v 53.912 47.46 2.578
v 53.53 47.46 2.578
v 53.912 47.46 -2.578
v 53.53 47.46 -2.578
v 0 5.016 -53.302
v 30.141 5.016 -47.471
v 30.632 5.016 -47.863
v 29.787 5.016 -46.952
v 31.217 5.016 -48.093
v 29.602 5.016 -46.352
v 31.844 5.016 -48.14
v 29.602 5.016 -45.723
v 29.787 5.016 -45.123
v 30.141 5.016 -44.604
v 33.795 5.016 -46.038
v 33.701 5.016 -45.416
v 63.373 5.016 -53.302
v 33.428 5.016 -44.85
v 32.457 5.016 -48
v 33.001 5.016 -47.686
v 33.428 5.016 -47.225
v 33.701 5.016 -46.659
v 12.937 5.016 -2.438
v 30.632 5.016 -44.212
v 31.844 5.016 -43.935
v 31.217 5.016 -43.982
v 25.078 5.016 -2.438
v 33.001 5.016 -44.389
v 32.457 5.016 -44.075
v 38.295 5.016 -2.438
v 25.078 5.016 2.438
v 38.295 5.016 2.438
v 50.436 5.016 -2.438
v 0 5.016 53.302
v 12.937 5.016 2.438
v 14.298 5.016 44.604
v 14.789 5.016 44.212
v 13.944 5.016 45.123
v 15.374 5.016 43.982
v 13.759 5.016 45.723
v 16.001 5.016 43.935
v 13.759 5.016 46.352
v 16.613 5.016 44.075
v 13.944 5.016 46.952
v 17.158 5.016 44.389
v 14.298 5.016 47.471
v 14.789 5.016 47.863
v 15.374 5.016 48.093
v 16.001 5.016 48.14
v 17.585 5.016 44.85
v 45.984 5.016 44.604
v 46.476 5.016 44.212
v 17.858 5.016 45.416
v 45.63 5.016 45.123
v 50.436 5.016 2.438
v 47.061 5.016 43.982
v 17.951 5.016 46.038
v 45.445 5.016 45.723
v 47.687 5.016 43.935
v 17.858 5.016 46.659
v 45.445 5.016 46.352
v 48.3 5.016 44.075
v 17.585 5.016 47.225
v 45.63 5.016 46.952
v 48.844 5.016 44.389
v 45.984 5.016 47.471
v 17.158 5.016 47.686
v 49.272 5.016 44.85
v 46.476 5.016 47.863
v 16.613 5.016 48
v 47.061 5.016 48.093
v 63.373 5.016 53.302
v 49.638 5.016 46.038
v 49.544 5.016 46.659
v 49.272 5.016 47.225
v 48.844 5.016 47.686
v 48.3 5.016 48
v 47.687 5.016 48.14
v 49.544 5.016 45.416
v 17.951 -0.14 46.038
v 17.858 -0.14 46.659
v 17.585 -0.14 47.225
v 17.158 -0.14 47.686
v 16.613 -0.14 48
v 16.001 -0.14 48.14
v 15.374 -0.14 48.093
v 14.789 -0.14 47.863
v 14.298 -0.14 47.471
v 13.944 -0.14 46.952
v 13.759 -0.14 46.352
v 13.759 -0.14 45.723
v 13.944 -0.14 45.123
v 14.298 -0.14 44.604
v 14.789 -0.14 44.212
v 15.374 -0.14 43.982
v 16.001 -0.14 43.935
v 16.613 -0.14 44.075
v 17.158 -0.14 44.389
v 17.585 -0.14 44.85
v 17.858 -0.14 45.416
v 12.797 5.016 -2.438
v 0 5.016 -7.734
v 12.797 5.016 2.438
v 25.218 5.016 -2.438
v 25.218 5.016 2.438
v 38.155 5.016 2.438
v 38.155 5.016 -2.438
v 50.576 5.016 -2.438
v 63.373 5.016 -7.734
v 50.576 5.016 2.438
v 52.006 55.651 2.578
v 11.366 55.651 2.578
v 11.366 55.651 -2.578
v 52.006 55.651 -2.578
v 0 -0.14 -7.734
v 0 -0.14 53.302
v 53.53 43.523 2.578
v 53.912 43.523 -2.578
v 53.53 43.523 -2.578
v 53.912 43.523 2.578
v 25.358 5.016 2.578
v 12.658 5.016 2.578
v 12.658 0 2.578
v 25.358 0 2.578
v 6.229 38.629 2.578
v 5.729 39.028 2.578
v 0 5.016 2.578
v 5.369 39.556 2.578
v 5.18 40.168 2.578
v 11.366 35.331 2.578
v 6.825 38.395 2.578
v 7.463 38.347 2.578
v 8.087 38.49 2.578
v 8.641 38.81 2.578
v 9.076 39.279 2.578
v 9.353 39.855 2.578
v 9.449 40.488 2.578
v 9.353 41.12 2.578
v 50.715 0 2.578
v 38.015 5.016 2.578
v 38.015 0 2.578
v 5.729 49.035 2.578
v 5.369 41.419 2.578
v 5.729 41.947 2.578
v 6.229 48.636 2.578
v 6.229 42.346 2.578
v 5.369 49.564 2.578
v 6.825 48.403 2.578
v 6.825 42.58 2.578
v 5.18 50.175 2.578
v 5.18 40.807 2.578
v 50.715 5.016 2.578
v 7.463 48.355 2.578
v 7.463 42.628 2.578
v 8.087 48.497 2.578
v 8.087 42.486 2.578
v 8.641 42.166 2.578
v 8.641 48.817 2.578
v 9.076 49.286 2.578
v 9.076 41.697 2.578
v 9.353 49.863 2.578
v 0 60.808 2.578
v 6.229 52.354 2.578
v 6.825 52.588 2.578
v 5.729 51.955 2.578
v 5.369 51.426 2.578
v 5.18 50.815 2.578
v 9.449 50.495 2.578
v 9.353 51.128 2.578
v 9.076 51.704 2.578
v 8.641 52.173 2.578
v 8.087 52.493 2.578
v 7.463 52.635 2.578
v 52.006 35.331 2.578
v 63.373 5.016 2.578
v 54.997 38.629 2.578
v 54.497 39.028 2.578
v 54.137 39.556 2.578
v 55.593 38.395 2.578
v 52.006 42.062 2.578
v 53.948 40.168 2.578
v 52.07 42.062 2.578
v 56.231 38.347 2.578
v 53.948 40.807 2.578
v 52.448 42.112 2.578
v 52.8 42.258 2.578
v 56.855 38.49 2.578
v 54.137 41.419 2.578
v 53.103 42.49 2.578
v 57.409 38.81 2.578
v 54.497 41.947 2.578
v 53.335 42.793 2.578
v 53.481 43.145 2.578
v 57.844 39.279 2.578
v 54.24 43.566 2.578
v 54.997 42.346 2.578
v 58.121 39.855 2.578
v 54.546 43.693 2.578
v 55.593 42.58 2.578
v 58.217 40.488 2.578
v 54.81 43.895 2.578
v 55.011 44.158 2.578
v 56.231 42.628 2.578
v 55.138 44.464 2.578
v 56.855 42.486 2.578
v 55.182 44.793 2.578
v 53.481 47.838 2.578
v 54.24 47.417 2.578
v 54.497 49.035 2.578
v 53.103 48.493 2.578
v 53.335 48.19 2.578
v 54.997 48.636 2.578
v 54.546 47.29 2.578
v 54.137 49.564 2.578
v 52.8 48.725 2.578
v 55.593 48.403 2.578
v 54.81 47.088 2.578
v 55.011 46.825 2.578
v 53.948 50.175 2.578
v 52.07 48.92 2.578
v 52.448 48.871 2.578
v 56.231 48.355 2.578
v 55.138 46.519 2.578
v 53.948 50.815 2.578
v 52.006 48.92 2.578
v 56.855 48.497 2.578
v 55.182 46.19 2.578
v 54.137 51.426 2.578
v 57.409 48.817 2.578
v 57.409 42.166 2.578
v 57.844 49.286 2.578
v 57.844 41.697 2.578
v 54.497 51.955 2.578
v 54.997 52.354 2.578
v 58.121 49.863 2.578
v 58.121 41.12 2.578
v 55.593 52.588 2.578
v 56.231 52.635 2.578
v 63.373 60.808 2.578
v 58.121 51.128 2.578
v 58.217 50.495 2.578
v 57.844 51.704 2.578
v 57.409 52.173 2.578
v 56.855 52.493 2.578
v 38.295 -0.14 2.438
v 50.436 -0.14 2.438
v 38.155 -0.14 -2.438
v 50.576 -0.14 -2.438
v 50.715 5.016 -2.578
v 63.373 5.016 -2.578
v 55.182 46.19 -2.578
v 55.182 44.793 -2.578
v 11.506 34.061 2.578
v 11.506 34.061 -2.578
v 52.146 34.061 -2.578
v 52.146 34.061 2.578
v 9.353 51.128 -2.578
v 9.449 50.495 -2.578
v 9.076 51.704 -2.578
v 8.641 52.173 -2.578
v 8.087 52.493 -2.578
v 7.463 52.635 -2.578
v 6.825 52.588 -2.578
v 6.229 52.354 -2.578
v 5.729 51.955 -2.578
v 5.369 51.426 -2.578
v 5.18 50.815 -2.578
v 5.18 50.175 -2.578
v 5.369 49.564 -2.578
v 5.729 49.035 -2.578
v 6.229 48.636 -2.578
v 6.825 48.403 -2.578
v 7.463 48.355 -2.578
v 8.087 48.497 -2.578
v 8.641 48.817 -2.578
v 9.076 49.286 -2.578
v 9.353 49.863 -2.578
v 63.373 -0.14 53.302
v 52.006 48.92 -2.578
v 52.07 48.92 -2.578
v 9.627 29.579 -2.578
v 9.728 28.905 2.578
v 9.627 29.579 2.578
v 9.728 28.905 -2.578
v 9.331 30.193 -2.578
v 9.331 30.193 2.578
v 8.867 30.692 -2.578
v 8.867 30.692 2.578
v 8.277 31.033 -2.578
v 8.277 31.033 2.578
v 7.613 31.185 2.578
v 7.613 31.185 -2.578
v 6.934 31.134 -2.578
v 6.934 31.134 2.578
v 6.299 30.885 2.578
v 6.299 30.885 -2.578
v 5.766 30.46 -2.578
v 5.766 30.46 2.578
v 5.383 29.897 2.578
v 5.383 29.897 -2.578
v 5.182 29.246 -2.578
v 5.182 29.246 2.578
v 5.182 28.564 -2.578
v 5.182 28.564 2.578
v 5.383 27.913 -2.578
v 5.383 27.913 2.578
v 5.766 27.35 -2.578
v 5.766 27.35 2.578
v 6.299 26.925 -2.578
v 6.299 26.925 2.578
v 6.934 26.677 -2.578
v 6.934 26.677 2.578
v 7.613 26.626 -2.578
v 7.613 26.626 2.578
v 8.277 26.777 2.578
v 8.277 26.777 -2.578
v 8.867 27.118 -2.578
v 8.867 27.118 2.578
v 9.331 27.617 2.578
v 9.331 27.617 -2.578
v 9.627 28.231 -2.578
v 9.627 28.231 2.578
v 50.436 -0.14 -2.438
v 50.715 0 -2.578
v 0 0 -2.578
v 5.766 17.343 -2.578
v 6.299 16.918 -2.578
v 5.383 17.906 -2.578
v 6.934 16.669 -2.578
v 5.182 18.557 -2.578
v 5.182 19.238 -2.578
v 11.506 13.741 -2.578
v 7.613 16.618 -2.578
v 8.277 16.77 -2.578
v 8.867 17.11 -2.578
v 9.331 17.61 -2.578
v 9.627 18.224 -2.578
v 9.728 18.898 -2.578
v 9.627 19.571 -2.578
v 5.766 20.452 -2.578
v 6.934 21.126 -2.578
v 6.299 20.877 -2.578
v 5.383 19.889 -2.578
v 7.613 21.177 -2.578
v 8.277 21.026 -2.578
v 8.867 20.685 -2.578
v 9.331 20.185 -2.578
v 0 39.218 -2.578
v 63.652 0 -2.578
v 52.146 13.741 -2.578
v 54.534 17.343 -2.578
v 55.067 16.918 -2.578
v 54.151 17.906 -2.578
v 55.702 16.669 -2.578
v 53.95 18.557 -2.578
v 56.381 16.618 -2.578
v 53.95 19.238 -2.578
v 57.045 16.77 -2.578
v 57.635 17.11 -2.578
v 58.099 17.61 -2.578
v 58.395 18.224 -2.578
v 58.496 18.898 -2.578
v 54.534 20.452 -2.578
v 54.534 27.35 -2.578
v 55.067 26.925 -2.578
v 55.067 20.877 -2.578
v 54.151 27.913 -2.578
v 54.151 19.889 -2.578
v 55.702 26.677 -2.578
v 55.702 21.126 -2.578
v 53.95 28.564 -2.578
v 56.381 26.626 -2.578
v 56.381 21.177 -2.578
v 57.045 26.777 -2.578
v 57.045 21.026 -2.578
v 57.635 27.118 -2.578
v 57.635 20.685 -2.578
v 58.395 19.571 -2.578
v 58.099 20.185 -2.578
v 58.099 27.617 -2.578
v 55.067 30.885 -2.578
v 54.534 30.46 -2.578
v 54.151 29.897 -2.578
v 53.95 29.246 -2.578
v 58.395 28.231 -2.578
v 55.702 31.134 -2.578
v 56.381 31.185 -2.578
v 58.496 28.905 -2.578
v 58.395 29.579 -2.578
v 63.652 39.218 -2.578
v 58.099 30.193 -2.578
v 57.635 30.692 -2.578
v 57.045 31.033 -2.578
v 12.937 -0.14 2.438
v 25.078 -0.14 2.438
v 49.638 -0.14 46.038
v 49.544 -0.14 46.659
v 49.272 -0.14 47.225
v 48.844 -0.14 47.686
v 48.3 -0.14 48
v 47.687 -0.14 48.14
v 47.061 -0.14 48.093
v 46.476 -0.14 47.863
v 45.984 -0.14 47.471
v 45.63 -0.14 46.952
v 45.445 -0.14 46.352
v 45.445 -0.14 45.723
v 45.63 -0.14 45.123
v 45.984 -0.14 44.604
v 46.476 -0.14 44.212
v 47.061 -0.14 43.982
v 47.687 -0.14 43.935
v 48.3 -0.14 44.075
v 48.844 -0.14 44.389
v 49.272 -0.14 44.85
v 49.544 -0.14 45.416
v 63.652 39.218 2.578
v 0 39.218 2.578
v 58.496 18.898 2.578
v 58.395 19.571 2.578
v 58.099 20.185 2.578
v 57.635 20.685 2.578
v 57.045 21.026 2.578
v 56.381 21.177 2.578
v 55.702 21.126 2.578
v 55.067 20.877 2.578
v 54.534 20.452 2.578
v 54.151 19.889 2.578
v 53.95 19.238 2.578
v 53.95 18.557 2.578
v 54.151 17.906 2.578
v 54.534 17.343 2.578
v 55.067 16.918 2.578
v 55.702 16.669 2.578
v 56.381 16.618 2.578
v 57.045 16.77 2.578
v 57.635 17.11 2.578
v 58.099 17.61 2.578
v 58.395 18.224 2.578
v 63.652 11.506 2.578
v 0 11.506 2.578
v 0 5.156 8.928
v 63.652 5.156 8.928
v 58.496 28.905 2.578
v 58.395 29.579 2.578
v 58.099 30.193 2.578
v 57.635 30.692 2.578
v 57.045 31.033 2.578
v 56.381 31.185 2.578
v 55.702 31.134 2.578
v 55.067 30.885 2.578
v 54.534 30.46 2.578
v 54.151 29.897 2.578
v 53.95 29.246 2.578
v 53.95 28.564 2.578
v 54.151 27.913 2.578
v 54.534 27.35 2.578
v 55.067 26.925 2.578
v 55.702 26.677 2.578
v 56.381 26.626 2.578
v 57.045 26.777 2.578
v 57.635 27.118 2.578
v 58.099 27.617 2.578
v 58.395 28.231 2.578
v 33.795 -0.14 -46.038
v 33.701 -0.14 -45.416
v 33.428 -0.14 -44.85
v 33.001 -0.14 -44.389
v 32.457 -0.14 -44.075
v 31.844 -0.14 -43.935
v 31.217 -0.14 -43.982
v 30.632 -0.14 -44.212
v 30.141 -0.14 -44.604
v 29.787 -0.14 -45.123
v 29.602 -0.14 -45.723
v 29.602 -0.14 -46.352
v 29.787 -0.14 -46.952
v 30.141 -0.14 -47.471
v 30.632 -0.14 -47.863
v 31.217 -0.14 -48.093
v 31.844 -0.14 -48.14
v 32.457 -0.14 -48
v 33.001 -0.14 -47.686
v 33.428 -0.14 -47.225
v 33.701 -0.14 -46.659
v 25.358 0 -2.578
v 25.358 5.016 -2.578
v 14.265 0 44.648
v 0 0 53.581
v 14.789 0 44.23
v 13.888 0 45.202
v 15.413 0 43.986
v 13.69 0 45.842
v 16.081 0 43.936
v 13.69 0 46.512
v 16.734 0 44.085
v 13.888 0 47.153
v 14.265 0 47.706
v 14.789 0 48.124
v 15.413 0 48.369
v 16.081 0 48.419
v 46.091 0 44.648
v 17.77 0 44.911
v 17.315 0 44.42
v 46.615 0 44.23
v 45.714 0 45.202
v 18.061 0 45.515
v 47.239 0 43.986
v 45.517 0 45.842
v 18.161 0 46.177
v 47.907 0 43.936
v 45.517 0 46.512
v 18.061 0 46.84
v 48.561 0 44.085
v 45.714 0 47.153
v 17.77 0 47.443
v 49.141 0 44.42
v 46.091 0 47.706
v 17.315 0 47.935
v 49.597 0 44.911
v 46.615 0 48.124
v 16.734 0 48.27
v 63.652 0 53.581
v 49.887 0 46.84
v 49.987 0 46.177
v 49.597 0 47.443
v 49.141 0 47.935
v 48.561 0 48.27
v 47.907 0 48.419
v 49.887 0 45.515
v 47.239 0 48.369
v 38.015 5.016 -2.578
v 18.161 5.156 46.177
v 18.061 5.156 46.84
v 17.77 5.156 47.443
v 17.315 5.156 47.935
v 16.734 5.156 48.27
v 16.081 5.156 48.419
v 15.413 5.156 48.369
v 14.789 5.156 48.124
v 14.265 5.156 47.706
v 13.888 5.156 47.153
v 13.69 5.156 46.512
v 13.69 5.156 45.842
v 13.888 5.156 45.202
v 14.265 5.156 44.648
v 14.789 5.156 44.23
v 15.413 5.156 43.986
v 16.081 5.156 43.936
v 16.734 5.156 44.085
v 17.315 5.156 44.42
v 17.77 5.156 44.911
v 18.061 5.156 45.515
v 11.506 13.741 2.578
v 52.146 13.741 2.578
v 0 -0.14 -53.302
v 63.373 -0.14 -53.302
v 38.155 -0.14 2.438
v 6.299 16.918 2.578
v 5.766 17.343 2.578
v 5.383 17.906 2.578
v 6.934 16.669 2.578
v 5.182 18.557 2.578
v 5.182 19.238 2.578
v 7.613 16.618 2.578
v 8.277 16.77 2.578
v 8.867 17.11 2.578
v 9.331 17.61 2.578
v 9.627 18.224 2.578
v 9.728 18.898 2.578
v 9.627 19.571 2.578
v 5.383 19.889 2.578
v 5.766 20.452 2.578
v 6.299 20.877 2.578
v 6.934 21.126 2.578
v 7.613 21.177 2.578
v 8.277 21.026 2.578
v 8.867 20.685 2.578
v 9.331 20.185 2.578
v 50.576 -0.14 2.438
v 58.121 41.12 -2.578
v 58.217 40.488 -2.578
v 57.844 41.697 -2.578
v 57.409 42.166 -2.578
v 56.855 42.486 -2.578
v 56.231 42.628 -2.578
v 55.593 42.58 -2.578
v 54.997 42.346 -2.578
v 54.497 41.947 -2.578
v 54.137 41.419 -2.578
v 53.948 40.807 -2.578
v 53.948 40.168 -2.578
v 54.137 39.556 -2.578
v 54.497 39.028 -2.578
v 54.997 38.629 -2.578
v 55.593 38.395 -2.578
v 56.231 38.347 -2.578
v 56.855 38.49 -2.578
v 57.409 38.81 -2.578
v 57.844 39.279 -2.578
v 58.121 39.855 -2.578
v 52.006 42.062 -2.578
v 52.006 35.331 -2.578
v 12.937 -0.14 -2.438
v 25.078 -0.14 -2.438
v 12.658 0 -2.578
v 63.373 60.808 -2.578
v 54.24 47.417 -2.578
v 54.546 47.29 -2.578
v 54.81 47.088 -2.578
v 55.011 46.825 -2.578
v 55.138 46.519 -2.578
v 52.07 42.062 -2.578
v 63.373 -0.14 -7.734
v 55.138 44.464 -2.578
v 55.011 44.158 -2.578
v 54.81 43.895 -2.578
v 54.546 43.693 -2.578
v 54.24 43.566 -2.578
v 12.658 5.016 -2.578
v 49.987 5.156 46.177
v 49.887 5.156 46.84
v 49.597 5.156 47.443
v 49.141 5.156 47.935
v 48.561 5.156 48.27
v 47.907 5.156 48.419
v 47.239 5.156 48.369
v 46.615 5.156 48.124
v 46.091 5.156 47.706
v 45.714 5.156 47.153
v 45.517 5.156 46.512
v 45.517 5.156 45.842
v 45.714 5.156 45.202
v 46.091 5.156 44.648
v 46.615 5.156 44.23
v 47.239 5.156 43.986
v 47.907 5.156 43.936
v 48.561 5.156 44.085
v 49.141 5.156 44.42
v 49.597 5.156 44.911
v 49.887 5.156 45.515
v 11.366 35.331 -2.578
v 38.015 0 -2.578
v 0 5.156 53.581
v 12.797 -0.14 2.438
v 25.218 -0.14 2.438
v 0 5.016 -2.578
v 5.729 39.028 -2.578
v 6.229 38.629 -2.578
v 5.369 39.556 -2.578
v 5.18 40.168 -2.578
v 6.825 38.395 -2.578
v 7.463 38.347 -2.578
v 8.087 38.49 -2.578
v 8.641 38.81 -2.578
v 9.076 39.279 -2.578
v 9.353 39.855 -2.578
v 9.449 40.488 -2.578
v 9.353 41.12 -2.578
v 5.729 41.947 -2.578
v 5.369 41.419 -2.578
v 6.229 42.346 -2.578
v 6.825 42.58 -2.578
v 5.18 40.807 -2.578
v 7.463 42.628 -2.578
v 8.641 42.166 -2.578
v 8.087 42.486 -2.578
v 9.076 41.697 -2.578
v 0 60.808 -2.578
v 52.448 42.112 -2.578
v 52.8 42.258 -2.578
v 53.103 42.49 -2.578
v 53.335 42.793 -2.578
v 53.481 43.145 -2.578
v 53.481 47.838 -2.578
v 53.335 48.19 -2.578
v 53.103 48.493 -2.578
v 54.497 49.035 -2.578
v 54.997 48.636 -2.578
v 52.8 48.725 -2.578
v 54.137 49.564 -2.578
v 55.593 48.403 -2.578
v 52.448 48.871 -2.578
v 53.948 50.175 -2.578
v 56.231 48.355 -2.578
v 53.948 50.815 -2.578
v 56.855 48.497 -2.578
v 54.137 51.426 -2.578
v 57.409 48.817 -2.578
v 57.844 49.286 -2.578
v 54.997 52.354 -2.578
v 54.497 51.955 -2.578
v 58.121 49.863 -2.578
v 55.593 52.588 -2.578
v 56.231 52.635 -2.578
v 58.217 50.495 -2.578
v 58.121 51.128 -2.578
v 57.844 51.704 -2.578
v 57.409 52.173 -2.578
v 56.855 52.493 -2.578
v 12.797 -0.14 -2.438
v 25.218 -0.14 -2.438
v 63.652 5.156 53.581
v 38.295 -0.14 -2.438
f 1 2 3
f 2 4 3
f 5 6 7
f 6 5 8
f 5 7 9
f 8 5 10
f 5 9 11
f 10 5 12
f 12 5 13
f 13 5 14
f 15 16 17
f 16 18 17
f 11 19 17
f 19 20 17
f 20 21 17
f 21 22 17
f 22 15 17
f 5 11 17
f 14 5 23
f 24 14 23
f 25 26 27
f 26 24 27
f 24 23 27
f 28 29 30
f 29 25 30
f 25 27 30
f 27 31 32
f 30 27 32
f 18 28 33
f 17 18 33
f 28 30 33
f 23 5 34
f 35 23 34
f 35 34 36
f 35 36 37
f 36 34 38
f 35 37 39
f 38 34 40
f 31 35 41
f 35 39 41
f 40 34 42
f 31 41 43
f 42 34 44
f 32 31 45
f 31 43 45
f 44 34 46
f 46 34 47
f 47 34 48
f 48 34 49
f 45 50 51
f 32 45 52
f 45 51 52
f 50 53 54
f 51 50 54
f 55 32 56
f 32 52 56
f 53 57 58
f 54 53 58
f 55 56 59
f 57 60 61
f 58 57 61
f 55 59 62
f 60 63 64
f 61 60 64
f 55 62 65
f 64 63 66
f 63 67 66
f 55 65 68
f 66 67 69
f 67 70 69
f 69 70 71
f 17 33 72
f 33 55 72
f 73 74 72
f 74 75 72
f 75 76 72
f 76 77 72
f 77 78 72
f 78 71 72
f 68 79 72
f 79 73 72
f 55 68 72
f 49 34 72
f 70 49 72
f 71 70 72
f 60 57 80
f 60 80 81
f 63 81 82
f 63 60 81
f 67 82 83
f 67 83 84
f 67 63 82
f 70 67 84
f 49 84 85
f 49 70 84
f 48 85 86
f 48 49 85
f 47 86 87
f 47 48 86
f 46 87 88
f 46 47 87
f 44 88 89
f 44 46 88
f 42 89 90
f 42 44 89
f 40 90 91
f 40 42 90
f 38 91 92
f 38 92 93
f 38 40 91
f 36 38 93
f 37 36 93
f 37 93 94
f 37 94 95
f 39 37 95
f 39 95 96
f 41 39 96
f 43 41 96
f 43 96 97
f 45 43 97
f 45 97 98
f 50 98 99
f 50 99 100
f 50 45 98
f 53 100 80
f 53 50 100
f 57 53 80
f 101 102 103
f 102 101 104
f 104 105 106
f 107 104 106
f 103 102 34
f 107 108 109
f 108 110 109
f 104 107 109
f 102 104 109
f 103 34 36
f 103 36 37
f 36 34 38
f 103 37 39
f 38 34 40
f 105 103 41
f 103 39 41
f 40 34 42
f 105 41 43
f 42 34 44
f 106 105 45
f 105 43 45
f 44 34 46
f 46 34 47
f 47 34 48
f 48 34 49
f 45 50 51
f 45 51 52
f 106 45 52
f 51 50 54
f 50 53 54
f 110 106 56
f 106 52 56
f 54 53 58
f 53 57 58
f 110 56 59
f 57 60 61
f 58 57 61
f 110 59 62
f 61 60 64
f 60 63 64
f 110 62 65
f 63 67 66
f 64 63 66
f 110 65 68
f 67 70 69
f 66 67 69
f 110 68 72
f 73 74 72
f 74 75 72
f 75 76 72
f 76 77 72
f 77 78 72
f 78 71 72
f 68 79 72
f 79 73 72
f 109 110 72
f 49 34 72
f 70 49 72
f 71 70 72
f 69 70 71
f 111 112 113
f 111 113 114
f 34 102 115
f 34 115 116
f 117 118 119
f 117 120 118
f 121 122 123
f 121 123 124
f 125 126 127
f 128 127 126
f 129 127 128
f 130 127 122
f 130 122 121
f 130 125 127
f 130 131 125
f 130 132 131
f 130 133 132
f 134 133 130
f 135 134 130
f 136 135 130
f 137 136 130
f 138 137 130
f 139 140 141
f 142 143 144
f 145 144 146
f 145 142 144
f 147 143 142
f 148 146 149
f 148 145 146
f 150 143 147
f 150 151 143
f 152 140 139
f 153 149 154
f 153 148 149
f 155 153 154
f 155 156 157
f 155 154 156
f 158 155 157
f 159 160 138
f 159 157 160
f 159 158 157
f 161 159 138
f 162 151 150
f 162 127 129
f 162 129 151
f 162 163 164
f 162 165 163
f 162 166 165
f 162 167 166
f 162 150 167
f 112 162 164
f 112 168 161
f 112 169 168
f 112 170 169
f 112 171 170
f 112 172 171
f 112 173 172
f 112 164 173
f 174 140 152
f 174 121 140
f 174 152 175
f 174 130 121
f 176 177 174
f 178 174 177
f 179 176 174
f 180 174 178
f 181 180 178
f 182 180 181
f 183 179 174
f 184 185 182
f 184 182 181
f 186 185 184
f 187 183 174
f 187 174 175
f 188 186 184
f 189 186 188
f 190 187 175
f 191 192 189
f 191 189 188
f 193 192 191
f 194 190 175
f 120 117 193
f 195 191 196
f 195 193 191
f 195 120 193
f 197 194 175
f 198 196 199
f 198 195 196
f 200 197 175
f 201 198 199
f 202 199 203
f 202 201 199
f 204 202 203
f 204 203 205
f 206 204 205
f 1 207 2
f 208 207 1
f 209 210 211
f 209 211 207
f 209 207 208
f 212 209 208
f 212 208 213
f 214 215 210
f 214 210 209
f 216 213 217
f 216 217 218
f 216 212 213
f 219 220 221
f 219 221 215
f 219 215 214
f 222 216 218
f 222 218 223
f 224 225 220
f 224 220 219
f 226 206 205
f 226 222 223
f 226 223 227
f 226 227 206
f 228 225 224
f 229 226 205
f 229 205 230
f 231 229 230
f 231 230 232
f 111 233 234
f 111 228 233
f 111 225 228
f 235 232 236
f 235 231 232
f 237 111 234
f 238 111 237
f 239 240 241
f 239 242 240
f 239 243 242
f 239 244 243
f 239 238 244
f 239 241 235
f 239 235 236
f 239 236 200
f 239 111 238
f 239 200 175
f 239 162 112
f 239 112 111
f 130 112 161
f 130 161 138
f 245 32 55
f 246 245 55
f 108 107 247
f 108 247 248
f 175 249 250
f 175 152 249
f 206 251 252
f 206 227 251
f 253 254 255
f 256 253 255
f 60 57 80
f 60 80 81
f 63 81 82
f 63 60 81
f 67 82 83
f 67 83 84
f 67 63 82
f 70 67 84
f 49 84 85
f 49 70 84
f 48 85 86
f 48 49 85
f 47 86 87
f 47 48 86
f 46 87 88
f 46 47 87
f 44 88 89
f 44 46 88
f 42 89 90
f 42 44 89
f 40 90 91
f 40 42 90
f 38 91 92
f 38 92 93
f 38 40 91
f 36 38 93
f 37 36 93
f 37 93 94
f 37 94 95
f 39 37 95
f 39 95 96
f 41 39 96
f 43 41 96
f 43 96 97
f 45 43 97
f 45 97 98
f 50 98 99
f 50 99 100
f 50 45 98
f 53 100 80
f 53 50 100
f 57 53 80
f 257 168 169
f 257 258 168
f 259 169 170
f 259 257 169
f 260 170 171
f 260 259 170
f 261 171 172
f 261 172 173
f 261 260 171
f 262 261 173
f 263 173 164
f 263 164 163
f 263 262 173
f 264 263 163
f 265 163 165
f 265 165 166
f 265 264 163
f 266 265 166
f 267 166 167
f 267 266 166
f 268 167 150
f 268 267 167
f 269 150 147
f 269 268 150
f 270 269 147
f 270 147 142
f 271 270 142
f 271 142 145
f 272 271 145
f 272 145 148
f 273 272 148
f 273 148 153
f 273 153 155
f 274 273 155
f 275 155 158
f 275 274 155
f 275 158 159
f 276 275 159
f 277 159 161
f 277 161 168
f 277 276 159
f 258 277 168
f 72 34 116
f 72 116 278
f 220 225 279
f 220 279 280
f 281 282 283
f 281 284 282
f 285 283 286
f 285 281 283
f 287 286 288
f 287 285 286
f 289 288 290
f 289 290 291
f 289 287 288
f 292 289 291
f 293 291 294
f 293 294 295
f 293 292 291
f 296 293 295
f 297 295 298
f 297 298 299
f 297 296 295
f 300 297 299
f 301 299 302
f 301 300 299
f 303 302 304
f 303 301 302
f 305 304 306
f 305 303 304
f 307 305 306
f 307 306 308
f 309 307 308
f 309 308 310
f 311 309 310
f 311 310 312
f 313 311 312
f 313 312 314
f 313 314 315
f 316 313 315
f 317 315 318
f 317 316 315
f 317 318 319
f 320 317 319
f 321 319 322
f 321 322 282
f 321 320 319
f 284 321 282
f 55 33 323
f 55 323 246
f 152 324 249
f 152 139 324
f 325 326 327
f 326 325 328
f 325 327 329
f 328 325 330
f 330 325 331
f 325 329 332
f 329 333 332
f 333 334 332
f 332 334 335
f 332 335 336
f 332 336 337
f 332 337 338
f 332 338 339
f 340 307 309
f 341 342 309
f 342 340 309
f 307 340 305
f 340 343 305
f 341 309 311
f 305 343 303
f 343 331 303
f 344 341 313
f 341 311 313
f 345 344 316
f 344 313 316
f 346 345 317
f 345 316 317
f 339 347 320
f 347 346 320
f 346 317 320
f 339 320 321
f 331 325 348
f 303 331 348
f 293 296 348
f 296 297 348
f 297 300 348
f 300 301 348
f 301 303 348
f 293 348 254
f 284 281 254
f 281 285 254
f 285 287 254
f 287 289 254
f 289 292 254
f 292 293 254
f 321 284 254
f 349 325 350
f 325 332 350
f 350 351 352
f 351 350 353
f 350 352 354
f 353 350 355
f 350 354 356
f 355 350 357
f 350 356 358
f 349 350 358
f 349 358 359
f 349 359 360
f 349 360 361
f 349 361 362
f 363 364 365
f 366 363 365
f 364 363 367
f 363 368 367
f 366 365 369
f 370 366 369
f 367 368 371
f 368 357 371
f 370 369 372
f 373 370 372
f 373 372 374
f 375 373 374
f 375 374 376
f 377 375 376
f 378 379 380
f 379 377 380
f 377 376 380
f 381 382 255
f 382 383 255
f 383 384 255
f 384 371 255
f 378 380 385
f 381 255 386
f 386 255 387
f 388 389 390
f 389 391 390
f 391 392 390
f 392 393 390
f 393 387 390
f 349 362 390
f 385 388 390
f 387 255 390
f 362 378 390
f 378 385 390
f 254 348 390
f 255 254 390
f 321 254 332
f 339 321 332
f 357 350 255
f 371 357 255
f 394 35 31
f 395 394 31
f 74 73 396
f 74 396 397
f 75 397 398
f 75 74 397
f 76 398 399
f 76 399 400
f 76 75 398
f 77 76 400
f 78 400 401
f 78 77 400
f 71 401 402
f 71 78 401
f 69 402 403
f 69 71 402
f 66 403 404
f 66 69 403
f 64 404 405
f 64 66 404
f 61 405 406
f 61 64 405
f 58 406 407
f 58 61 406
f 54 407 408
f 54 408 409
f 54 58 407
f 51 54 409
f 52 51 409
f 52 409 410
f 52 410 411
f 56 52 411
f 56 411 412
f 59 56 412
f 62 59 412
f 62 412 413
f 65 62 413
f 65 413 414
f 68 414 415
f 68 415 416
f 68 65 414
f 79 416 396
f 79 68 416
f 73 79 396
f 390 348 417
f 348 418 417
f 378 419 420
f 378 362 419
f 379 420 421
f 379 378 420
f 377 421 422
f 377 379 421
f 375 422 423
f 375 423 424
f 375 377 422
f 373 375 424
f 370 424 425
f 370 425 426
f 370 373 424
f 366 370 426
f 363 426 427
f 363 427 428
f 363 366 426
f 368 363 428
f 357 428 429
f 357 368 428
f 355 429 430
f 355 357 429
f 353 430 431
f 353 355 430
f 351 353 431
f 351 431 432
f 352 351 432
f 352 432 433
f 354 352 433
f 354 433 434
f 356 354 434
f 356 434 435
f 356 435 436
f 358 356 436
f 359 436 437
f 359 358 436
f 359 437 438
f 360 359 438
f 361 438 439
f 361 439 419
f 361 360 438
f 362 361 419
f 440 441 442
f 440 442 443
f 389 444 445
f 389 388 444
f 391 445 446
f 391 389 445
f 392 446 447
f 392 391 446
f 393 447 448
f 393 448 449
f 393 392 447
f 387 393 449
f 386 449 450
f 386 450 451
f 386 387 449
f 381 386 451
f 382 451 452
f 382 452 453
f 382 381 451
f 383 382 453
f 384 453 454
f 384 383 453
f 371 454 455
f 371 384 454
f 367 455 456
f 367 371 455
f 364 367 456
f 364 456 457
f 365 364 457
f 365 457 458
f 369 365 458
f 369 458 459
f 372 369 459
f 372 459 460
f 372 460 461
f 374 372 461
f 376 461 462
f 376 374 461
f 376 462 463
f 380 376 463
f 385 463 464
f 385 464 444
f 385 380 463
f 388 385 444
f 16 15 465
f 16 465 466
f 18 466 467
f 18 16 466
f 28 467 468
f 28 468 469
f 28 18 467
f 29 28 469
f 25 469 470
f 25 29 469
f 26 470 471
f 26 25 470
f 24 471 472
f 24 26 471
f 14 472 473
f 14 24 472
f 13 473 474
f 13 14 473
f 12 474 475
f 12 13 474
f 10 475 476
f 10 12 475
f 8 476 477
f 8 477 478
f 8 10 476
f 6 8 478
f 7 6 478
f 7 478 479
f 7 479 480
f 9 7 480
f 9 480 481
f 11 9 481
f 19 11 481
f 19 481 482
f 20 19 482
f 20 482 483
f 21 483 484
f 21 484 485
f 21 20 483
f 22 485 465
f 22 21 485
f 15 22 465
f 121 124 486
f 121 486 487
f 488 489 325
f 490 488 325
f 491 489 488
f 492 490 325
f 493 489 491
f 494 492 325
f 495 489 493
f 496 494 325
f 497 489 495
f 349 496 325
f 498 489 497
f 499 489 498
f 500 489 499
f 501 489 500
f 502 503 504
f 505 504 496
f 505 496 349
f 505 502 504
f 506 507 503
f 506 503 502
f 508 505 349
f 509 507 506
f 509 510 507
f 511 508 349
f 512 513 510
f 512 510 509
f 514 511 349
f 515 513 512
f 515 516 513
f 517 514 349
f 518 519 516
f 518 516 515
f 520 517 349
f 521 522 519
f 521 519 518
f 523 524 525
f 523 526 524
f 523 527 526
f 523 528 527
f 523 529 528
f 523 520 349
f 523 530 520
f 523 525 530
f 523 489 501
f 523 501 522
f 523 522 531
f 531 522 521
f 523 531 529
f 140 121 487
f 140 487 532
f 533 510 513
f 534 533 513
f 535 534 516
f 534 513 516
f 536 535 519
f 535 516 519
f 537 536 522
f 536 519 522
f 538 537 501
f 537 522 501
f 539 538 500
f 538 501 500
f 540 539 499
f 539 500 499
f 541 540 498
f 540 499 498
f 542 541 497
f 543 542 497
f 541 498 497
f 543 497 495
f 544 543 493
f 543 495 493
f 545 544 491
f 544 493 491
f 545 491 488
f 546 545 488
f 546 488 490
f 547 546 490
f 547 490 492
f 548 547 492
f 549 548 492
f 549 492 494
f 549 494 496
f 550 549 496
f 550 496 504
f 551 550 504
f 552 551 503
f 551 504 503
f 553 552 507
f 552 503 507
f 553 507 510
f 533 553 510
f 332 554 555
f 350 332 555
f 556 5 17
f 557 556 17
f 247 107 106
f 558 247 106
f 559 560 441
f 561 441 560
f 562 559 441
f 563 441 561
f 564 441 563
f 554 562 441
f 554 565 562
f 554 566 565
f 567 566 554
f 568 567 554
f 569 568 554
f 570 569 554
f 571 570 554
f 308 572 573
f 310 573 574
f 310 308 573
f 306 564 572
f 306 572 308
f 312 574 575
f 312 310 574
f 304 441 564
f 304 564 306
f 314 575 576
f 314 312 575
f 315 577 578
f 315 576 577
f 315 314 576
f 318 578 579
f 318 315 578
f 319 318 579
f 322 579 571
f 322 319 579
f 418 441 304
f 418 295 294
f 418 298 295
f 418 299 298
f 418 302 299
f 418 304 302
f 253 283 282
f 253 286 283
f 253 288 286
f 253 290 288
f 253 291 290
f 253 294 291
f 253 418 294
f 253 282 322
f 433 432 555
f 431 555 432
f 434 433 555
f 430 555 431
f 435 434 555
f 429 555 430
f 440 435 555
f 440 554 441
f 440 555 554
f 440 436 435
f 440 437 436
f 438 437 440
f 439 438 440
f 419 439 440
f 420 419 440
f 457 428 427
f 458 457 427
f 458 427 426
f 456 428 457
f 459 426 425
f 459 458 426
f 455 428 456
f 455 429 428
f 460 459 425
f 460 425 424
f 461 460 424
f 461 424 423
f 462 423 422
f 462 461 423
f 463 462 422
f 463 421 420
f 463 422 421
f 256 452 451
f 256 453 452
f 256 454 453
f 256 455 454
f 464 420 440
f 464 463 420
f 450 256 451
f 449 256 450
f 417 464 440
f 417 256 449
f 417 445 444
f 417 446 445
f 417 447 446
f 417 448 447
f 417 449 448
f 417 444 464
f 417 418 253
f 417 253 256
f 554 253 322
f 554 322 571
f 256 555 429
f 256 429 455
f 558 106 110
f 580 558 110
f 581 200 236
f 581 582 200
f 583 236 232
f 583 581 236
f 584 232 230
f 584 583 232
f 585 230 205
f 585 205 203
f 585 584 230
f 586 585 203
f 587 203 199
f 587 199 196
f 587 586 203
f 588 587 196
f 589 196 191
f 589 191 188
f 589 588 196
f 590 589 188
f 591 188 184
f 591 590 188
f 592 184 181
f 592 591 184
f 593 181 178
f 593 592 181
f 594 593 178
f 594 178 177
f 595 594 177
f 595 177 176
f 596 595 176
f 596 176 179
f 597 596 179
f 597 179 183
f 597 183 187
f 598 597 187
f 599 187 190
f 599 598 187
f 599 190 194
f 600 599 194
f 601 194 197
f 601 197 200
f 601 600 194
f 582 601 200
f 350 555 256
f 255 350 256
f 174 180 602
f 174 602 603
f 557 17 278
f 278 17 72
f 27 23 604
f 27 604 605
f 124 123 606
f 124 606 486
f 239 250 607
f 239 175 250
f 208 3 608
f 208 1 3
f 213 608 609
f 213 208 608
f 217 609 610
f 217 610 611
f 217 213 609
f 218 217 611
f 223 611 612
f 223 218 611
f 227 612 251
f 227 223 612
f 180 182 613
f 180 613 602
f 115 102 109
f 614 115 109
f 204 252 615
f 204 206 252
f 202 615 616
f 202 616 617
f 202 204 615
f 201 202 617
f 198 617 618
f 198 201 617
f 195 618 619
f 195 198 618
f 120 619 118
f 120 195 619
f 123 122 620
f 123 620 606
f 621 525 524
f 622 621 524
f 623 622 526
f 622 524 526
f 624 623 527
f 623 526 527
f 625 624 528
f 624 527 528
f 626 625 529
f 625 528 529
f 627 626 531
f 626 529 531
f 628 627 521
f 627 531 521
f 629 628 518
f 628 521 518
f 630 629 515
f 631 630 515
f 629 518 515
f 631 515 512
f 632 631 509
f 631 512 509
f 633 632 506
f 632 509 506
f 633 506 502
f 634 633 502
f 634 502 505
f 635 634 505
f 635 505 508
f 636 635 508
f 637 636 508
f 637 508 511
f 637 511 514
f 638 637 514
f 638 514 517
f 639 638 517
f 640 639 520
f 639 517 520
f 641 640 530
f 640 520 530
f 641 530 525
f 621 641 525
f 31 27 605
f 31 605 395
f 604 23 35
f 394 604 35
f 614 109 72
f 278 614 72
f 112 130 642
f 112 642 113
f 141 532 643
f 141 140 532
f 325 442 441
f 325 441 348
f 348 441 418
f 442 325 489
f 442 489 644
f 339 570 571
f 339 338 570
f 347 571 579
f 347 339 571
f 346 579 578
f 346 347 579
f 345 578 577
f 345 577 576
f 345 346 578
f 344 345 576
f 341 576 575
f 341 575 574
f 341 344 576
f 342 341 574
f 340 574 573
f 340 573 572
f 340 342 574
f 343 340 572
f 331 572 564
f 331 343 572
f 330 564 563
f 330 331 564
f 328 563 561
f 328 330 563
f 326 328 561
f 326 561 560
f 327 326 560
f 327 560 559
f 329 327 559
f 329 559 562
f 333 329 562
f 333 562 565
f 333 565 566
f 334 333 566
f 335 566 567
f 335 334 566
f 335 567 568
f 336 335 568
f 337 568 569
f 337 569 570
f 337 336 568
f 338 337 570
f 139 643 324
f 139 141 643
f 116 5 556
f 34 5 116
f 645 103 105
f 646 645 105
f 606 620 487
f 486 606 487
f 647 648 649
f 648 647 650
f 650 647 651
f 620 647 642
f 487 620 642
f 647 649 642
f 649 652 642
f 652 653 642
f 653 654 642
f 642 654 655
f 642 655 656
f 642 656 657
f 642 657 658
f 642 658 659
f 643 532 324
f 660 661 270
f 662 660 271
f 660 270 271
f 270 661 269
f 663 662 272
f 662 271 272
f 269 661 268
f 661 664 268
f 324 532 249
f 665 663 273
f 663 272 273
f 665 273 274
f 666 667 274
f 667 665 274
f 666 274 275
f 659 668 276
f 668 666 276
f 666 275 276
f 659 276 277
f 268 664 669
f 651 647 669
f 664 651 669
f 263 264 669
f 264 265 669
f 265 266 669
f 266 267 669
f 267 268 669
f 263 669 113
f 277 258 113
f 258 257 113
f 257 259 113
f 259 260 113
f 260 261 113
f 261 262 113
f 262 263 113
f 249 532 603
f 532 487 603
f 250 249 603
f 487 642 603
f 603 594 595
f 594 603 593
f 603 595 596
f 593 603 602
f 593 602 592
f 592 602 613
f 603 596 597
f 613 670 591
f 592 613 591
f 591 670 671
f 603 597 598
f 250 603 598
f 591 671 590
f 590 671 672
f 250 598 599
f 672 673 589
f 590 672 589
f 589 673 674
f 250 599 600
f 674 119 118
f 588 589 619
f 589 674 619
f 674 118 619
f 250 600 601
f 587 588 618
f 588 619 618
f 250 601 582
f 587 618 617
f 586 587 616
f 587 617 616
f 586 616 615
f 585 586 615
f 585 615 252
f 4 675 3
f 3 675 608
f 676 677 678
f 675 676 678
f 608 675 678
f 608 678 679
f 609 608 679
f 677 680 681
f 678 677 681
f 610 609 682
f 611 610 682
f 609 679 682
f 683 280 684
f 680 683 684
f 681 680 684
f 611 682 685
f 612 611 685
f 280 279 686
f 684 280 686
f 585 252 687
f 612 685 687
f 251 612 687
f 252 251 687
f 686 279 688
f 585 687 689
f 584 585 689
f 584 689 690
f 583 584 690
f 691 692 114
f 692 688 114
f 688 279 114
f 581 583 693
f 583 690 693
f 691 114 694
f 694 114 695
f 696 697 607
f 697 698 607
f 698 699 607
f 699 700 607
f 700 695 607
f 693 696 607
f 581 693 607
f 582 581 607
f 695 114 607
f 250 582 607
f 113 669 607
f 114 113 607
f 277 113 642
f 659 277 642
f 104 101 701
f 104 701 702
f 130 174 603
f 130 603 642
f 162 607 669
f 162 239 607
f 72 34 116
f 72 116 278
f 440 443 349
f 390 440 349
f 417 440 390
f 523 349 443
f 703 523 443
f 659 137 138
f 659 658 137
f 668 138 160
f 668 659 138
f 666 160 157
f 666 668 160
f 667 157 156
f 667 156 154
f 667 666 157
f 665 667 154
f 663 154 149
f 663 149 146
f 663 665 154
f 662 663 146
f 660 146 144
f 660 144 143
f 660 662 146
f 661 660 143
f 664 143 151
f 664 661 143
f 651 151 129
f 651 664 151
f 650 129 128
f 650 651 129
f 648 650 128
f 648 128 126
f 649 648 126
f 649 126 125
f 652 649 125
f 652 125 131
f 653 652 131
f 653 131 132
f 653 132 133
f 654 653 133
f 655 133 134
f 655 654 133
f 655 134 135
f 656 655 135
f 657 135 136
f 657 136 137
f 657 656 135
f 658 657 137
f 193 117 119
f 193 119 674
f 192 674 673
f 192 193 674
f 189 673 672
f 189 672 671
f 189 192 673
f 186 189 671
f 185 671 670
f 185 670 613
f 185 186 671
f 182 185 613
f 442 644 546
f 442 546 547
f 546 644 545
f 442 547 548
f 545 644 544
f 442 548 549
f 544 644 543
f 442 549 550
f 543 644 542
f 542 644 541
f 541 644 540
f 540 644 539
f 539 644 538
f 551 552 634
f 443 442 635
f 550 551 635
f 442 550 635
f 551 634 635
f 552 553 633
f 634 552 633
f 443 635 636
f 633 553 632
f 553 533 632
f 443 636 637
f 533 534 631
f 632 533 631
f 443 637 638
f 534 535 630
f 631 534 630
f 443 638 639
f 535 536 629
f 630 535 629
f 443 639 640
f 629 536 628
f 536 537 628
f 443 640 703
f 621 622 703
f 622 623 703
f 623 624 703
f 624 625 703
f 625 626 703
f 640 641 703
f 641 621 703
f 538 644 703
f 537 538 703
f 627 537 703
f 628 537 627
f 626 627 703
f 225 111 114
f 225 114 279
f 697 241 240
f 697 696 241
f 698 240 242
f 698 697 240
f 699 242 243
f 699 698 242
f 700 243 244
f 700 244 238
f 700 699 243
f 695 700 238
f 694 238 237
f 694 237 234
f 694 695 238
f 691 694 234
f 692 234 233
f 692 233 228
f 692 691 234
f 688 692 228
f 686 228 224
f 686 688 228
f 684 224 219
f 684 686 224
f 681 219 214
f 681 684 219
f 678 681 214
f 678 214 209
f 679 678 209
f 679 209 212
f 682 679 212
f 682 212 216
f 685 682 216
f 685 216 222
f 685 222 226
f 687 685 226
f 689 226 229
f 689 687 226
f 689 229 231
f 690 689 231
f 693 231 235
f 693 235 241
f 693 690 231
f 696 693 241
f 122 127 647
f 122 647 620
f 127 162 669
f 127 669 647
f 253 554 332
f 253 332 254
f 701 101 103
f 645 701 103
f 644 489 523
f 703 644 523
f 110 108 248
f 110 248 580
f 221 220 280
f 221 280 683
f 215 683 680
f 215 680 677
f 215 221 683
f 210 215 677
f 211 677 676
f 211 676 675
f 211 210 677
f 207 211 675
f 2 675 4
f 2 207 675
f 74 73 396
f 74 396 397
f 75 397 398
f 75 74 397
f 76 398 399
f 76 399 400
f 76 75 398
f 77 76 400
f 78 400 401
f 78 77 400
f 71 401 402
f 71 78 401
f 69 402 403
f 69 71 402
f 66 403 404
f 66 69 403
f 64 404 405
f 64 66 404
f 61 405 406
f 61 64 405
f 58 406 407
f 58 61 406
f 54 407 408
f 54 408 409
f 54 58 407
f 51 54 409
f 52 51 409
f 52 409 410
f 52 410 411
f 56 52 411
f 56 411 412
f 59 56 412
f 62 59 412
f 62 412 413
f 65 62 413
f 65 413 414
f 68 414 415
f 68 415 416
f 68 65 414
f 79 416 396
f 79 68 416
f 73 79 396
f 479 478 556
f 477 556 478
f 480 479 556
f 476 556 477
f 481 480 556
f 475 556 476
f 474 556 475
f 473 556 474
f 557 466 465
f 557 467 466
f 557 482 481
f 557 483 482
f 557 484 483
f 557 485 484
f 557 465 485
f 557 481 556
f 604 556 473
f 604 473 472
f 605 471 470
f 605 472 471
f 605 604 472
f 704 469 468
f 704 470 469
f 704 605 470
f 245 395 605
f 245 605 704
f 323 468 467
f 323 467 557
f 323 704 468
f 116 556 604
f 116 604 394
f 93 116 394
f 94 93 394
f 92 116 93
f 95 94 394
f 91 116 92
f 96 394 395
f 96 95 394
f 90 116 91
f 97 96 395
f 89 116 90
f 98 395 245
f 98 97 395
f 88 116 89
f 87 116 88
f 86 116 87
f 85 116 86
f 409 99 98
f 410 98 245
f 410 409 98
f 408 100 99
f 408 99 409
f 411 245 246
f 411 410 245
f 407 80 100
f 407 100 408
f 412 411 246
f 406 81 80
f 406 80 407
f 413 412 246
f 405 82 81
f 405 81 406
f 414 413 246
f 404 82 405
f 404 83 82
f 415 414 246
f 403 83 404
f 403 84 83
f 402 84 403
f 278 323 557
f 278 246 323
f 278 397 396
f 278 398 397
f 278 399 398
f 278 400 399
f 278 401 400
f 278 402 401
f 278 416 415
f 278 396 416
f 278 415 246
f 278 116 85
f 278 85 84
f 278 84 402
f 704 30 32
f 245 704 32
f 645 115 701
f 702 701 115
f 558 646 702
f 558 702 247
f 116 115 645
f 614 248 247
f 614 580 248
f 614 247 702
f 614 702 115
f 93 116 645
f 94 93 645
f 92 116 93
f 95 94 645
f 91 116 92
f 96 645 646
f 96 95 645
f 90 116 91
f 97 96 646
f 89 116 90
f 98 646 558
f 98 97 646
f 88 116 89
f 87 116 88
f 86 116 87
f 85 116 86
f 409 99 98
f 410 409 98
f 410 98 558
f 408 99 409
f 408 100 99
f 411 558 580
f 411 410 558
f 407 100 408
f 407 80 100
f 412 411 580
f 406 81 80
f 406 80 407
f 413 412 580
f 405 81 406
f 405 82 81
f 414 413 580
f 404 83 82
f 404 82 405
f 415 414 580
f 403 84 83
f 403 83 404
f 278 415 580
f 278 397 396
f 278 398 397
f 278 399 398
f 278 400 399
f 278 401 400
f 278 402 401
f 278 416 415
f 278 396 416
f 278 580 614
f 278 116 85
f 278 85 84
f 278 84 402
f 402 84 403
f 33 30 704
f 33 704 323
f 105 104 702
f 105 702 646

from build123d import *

# Parameters (mm, degrees)
F1_W      = 63.6524
F1_H      = 39.2176
F1_R      = 2.286
F1_W_2    = 40.64
F1_H_2    = 20.32
F2_DEPTH  = 2.5781
F3_W      = 63.6524
F3_H      = 56.1594
F3_R      = 2.2479
F4_DEPTH  = 5.1562
F5_SIZE   = 6.35
F6_R      = 2.1463
F7_DEPTH  = 2.5781
F8_W      = 63.373
F8_H      = 61.0362
F8_W_2    = 12.4206
F8_H_2    = 4.8768
F8_R      = 2.1082
F9_DEPTH  = 5.1562
F10_R     = 1.27
F11_W     = 63.373
F11_H     = 106.6038
F11_R     = 2.1082
F11_W_2   = 12.1412
F11_H_2   = 4.8768
F12_DEPTH = 5.1562


# Not quite as in the source:
# - a variable given as a bare number and used for a length is read in inches; the dataset says mm whatever the document's units were


with BuildPart() as f2:
    # F1 (on Top) → F2 (new body, symmetric)
    with BuildSketch(Plane.XY):
        with Locations((31.8262, 19.6088)):
            Rectangle(F1_W, F1_H)
        with Locations((7.4422, 18.8976)):
            Circle(F1_R, mode=Mode.SUBTRACT)
        with Locations((56.2102, 18.8976)):
            Circle(F1_R, mode=Mode.SUBTRACT)
        with Locations((7.4422, 28.9052)):
            Circle(F1_R, mode=Mode.SUBTRACT)
        with Locations((31.8262, 23.9014)):
            Rectangle(F1_W_2, F1_H_2, mode=Mode.SUBTRACT)
        with Locations((56.2102, 28.9052)):
            Circle(F1_R, mode=Mode.SUBTRACT)
    extrude(amount=F2_DEPTH, both=True)

    # F3 (on Front) → F4 (join)
    with BuildSketch(Plane.XZ):
        with Locations((31.8262, 25.5016)):
            Rectangle(F3_W, F3_H)
        with Locations((15.9131, 46.1772)):
            Circle(F3_R, mode=Mode.SUBTRACT)
        with Locations((47.7393, 46.1772)):
            Circle(F3_R, mode=Mode.SUBTRACT)
    extrude(amount=-F4_DEPTH)

    # F5
    f5_edges = [f2.edges().sort_by_distance(p)[0] for p in [
        (31.8262, 5.1562, 2.5781),
    ]]
    chamfer(f5_edges, length=F5_SIZE)


with BuildPart() as f7:
    # F6 (on Top) → F7 (new body, symmetric)
    with BuildSketch(Plane.XY):
        Polygon((63.373, 60.8076), (0, 60.8076), (0, 5.0165), (12.6576666667, 5.0165), (12.6576666667, 0), (25.3576666667, 0), (25.3576666667, 5.0165), (38.0153333333, 5.0165), (38.0153333333, 0), (50.7153333333, 0), (50.7153333333, 5.0165), (63.373, 5.0165), align=None)
        with Locations((7.3025, 40.4876)):
            Circle(F6_R, mode=Mode.SUBTRACT)
        with Locations((7.3025, 50.4952)):
            Circle(F6_R, mode=Mode.SUBTRACT)
        with BuildLine():
            Line((11.3665, 35.3314), (11.3665, 55.6514))
            Line((11.3665, 55.6514), (52.0065, 55.6514))
            Line((52.0065, 55.6514), (52.0065, 48.9204))
            Line((52.0065, 48.9204), (52.07, 48.9204))
            ThreePointArc((52.07, 48.9204), (53.1027294539, 48.4926294539), (53.5305, 47.4599))
            Line((53.5305, 47.4599), (55.1815, 47.4599))
            Line((55.1815, 47.4599), (55.1815, 43.5229))
            Line((55.1815, 43.5229), (53.5305, 43.5229))
            ThreePointArc((53.5305, 43.5229), (53.1027294539, 42.4901705461), (52.07, 42.0624))
            Line((52.07, 42.0624), (52.0065, 42.0624))
            Line((52.0065, 42.0624), (52.0065, 35.3314))
            Line((52.0065, 35.3314), (11.3665, 35.3314))
        make_face(mode=Mode.SUBTRACT)
        with Locations((56.0705, 40.4876)):
            Circle(F6_R, mode=Mode.SUBTRACT)
        with Locations((56.0705, 50.4952)):
            Circle(F6_R, mode=Mode.SUBTRACT)
    extrude(amount=F7_DEPTH, both=True)

    # F10
    f10_edges = [f7.edges().sort_by_distance(p)[0] for p in [
        (55.1815, 47.4599, 0),
        (55.1815, 43.5229, 0),
    ]]
    fillet(f10_edges, radius=F10_R)


with BuildPart() as f9:
    # F8 (on face) → F9 (new body)
    with BuildSketch(Plane.XZ.offset(-5.0165)):
        with Locations((31.6865, 22.7838)):
            Rectangle(F8_W, F8_H)
        with Locations((19.0076666667, 0)):
            Rectangle(F8_W_2, F8_H_2, mode=Mode.SUBTRACT)
        with Locations((44.3653333333, 0)):
            Rectangle(F8_W_2, F8_H_2, mode=Mode.SUBTRACT)
        with Locations((15.84325, 46.0375)):
            Circle(F8_R, mode=Mode.SUBTRACT)
        with Locations((47.52975, 46.0375)):
            Circle(F8_R, mode=Mode.SUBTRACT)
    extrude(amount=F9_DEPTH)


with BuildPart() as f12:
    # F11 (on face) → F12 (new body)
    with BuildSketch(Plane.XZ.offset(-5.0165)):
        with Locations((31.6865, 0)):
            Rectangle(F11_W, F11_H)
        with Locations((31.6865, -46.0375)):
            Circle(F11_R, mode=Mode.SUBTRACT)
        with Locations((19.0076666667, 0)):
            Rectangle(F11_W_2, F11_H_2, mode=Mode.SUBTRACT)
        with Locations((15.84325, 46.0375)):
            Circle(F11_R, mode=Mode.SUBTRACT)
        with Locations((44.3653333333, 0)):
            Rectangle(F11_W_2, F11_H_2, mode=Mode.SUBTRACT)
        with Locations((47.52975, 46.0375)):
            Circle(F11_R, mode=Mode.SUBTRACT)
    extrude(amount=F12_DEPTH)


solid = Compound([f2.part, f7.part, f9.part, f12.part])
